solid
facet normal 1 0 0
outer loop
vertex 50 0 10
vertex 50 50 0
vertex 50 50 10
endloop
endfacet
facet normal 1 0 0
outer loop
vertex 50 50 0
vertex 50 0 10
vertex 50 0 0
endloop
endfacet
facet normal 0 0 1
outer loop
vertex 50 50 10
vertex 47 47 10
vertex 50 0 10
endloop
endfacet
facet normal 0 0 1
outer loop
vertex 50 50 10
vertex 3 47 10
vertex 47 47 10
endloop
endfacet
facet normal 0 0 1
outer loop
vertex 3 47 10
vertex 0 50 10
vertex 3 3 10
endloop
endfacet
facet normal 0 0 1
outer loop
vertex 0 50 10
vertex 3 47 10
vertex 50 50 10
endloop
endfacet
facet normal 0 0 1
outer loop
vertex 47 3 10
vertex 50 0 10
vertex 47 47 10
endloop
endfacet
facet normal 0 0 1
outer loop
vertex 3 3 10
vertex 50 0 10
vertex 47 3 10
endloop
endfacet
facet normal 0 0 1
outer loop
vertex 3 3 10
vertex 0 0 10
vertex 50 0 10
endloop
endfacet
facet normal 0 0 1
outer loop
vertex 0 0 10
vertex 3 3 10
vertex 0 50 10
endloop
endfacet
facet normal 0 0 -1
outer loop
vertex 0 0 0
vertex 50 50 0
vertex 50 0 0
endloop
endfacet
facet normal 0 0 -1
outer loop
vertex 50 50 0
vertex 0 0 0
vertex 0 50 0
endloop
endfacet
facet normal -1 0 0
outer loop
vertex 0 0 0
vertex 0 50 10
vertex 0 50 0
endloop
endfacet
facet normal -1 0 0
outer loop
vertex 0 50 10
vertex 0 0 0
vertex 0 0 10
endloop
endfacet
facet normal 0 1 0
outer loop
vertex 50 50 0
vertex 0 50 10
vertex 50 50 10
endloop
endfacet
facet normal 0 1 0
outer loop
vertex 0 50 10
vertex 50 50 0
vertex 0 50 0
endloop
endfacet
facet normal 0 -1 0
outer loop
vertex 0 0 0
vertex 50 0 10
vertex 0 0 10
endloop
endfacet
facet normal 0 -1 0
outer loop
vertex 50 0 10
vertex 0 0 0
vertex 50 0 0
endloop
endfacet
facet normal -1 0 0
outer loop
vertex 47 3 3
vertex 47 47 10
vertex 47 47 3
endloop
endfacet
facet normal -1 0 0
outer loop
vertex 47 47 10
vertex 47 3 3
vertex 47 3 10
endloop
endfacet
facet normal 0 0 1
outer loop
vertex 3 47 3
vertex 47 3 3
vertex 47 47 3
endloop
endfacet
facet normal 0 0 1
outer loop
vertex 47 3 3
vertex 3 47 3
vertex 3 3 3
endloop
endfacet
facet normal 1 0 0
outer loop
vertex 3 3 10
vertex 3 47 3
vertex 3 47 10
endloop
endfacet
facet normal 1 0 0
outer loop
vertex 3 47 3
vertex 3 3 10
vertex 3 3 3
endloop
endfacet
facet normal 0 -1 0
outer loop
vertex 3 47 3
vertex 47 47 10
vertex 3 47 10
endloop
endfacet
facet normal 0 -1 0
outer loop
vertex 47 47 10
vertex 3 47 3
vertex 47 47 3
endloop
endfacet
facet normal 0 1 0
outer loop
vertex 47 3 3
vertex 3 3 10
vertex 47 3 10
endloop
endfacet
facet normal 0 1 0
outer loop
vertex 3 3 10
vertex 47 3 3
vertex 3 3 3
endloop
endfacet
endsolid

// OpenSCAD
// Generated by HEIDI for job job_1787719485944_4a9840d2
// Product: 3D-Printable Model Preparation Package
// Request: E2E production path qualification test — automated cleanup expected
// Model type: box
// Generated: 2026-09-07T04:35:14.802Z
//
// This is a parameterized OpenSCAD model. You can adjust the
// parameters below to customize the dimensions before rendering.

// ─── Parameters ───
width = 50;       // X dimension in mm
height = 50;     // Y dimension in mm
depth = 10;       // Z dimension in mm
wall = 3;    // wall thickness in mm
$fn = 60;               // facet resolution

// Parametric hollow box
module parametric_box() {
    difference() {
        // Outer shell
        cube([width, height, depth]);
        // Inner cavity
        translate([wall, wall, wall])
            cube([width - wall * 2, height - wall * 2, depth - wall + 1]);
    }
}
parametric_box();
